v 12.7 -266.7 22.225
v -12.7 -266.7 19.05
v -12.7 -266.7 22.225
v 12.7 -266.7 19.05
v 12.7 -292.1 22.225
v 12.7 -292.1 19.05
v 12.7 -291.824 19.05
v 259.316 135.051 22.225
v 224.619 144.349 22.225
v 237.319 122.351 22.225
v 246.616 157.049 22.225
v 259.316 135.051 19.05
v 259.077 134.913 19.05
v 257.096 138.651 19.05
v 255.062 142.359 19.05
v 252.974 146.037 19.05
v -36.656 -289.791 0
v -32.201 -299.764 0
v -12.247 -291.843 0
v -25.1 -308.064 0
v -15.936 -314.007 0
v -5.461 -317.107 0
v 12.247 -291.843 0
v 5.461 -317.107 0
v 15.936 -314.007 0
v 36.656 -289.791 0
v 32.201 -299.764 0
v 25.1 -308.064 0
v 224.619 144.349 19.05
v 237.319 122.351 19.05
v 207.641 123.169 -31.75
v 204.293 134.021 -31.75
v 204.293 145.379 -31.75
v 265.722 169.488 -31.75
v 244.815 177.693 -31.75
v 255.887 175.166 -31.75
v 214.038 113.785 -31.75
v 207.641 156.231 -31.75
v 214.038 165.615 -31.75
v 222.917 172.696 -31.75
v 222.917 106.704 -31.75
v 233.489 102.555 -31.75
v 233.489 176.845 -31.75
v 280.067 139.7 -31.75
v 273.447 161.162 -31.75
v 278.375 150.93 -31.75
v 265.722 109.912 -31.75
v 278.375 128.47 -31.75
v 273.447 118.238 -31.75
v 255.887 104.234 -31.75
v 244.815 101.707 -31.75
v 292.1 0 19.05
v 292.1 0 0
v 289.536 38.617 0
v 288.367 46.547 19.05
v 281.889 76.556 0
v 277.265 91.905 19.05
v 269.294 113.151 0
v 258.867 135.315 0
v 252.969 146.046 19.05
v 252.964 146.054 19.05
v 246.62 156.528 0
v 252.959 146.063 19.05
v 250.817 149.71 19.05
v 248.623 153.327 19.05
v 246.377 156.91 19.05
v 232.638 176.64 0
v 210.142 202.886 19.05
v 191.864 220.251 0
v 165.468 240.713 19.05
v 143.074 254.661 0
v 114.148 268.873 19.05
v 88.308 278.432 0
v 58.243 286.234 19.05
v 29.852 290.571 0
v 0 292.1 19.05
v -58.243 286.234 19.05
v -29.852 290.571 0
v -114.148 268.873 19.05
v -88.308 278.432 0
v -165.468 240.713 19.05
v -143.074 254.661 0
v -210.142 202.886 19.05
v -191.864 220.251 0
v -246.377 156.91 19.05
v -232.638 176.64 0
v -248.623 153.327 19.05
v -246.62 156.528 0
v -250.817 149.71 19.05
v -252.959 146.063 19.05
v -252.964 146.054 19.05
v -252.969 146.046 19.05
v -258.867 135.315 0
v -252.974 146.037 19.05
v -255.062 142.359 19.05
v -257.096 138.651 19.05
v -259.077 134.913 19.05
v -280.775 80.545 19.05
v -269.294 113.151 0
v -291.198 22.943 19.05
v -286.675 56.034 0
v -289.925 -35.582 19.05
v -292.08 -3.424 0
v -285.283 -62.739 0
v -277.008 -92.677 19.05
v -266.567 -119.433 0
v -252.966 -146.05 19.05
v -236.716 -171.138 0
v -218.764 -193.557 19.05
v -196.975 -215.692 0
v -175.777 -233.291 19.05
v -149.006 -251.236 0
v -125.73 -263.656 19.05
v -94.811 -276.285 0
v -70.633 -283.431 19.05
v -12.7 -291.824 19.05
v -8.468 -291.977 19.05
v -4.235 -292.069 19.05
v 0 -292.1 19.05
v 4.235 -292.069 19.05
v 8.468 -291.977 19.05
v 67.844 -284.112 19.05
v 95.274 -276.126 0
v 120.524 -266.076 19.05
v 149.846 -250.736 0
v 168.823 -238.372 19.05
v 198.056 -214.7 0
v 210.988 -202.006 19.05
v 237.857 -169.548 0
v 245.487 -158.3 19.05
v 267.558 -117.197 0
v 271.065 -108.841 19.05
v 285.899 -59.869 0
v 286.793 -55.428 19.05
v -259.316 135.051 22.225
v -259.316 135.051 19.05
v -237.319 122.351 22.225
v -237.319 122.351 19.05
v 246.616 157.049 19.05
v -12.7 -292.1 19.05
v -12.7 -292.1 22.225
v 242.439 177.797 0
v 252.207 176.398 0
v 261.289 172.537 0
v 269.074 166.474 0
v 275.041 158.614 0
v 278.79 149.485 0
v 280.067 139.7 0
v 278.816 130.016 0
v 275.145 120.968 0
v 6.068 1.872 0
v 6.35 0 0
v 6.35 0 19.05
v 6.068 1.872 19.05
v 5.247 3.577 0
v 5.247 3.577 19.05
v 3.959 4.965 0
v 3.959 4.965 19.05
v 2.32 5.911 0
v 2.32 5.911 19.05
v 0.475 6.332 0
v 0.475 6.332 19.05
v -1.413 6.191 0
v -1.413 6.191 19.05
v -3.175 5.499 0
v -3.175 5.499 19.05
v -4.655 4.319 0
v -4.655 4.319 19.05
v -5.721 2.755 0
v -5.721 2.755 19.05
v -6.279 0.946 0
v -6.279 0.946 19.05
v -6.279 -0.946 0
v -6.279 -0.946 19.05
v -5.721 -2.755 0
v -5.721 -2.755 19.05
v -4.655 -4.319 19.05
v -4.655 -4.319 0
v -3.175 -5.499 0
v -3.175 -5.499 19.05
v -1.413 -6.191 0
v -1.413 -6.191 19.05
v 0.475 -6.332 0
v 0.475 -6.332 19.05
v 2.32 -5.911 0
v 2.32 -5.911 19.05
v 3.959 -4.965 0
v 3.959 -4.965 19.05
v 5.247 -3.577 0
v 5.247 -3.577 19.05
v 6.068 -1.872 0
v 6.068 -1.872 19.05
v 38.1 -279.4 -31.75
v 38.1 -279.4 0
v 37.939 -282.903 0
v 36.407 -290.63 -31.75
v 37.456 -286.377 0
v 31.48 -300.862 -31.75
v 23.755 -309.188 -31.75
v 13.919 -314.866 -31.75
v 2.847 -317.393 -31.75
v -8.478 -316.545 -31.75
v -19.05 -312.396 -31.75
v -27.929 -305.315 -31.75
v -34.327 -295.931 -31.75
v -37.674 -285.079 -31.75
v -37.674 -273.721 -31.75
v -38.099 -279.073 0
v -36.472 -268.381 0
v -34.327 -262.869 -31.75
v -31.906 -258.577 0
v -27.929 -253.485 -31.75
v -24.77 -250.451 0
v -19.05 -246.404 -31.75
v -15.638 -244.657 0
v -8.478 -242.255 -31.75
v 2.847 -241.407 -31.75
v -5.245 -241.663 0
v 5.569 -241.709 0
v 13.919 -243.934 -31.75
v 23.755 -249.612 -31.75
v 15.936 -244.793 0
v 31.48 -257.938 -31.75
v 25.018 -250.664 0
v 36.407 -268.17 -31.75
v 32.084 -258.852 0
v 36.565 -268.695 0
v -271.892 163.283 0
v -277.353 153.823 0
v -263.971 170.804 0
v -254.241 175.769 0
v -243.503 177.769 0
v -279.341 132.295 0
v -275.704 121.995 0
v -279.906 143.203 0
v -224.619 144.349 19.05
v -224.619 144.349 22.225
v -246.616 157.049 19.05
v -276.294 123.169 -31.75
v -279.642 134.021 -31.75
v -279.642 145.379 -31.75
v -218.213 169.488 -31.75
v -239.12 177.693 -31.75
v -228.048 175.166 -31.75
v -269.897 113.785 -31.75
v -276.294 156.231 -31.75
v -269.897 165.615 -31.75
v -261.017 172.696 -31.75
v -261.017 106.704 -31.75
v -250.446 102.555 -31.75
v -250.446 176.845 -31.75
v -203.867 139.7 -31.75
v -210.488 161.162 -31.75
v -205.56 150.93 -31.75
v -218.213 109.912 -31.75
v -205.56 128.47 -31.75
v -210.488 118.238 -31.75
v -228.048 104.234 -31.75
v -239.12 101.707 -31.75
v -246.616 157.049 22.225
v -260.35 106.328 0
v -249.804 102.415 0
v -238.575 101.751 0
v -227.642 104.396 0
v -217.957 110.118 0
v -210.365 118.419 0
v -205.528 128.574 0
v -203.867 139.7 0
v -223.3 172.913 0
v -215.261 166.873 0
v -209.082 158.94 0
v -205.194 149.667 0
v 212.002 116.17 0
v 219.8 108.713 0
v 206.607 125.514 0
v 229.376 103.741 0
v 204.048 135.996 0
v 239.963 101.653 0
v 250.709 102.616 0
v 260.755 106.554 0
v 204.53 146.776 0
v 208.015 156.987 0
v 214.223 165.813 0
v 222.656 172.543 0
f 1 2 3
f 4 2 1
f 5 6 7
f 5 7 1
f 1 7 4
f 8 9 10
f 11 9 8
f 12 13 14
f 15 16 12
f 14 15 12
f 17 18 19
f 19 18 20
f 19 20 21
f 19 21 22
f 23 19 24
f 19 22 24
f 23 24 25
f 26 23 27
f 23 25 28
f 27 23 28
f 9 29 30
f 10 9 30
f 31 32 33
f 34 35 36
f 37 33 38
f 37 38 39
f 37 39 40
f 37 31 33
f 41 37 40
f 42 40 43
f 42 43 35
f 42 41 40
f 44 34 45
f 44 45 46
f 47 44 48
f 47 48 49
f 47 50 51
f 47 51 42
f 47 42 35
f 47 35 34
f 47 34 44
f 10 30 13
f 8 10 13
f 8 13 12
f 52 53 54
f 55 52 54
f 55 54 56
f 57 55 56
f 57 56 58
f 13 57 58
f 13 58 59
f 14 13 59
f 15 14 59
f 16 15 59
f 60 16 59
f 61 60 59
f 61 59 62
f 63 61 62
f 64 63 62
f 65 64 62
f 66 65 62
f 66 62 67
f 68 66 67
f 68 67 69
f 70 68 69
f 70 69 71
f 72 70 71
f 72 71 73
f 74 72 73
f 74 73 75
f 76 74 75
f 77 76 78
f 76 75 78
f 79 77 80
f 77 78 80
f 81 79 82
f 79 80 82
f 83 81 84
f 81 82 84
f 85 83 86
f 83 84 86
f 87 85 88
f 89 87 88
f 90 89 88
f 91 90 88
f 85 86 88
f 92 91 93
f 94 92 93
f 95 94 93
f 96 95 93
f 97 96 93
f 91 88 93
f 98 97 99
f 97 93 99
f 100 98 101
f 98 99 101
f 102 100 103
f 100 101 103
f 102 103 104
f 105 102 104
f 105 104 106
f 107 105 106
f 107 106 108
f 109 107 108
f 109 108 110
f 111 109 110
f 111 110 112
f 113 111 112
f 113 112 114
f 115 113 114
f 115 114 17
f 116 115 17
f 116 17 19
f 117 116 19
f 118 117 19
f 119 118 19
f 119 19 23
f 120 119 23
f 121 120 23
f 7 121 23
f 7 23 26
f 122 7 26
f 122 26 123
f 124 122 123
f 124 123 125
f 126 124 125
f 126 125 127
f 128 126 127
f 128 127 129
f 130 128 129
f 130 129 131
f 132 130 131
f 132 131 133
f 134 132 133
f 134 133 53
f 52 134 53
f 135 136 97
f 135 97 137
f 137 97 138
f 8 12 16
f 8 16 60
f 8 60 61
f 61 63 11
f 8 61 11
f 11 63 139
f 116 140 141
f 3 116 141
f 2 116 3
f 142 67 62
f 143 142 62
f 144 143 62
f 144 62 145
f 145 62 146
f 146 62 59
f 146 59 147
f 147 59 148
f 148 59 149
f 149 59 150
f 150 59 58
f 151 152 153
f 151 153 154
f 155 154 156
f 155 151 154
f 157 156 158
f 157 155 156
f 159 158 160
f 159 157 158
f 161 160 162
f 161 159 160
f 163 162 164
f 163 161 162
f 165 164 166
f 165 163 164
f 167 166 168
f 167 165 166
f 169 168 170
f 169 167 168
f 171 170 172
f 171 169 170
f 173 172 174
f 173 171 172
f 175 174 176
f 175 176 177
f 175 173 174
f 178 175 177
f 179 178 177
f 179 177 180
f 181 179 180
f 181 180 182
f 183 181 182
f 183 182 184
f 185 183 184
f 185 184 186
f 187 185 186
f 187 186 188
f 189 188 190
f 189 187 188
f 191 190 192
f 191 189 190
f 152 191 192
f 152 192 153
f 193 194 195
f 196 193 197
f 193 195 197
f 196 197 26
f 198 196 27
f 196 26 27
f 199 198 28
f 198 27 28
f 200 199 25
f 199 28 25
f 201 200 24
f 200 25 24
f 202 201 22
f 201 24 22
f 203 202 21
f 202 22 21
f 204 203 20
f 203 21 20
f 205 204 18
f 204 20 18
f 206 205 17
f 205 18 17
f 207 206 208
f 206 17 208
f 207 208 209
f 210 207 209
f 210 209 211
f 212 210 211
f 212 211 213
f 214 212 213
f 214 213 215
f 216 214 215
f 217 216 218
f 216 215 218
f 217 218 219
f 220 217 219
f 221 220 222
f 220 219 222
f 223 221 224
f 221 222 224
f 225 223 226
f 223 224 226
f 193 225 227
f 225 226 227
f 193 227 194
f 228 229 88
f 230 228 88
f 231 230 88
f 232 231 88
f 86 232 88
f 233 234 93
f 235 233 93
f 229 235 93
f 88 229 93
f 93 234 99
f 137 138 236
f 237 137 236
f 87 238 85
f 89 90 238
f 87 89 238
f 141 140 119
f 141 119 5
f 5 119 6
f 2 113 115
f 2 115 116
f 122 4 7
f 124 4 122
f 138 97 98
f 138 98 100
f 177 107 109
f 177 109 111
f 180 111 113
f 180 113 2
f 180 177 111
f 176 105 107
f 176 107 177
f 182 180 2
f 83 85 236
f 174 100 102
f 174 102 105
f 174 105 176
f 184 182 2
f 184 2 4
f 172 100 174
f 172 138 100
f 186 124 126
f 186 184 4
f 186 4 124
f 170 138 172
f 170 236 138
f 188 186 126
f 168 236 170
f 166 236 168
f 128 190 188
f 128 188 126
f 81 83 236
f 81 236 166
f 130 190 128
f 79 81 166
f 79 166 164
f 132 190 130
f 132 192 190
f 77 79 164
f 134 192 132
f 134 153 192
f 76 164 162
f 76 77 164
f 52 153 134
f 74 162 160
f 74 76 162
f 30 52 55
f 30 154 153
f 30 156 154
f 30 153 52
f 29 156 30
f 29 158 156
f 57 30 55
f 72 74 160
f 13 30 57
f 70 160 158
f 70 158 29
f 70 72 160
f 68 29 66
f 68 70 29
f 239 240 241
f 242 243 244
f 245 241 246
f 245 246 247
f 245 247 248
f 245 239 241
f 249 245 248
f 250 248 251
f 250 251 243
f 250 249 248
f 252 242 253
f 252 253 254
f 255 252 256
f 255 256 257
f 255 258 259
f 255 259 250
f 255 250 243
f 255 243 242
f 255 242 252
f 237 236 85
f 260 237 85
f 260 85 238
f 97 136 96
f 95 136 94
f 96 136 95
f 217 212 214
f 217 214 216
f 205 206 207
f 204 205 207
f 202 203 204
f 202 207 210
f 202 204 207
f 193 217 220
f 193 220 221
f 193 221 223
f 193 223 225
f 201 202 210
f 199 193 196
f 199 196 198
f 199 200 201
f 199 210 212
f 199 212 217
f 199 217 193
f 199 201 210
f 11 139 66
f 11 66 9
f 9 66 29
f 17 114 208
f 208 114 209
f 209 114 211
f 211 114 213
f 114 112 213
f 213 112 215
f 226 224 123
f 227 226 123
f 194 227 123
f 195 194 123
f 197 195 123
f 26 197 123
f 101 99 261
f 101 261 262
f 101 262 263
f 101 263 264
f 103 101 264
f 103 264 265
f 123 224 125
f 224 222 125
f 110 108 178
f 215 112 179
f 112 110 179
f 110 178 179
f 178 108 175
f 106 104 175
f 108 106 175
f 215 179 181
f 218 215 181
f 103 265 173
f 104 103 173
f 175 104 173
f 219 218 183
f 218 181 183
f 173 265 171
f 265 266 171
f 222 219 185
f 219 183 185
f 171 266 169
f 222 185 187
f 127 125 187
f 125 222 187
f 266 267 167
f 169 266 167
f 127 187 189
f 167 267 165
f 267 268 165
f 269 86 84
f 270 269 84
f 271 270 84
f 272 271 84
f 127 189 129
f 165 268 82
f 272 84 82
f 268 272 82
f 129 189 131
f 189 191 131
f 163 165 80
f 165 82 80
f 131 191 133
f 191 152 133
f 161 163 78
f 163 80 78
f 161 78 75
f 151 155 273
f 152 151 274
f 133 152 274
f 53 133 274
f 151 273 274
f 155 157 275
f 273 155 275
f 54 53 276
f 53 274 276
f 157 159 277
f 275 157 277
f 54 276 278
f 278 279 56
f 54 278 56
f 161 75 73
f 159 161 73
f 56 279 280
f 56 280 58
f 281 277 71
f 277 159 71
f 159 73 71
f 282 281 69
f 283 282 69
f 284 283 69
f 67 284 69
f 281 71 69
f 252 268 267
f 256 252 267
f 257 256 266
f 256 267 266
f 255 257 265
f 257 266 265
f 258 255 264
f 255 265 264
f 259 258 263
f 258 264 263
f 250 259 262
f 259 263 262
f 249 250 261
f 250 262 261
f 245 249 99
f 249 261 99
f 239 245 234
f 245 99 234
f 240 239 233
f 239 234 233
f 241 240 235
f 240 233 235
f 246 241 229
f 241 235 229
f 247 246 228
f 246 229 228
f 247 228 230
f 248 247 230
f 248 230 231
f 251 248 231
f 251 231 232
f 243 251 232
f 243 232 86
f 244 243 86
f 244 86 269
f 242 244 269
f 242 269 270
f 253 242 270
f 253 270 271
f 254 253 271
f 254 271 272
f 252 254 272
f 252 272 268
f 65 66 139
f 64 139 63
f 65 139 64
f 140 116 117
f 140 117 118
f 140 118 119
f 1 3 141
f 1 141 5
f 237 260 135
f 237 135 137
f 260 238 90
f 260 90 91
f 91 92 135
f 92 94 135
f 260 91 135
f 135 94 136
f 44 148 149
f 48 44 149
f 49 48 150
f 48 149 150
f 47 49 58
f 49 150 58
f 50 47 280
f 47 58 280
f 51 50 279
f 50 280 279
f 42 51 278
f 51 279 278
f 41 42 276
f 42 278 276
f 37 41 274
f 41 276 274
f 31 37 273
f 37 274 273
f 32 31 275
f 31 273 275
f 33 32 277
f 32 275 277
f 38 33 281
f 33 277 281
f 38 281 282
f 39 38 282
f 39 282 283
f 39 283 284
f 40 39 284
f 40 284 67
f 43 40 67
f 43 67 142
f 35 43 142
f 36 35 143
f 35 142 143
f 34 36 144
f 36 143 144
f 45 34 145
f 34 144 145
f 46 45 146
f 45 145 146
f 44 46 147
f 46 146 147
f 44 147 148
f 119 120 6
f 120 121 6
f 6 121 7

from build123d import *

# Parameters (mm, degrees)
SKETCH003_R   = 292.1
SKETCH003_R_2 = 6.35
PAD003_DEPTH  = 19.05
SKETCH004_R   = 38.1
PAD004_DEPTH  = 31.75
SKETCH005_W   = 25.4
SKETCH005_H   = 25.4
PAD005_DEPTH  = 3.175


with BuildPart() as part:
    # Sketch003 → Pad003 (new body)
    with BuildSketch(Plane.XY):
        Circle(SKETCH003_R)
        Circle(SKETCH003_R_2, mode=Mode.SUBTRACT)
    extrude(amount=PAD003_DEPTH)

    # Sketch004 (on Face3 of Pad003) → Pad004 (join)
    with BuildSketch(Plane(origin=(0, 0, 0), x_dir=(1, 0, 0), z_dir=(0, 0, -1))):
        with Locations((0, 279.4)):
            Circle(SKETCH004_R)
        with Locations((241.967498, -139.7)):
            Circle(SKETCH004_R)
        with Locations((-241.967498, -139.7)):
            Circle(SKETCH004_R)
    extrude(amount=PAD004_DEPTH)

    # Sketch005 (on Face6 of Pad004) → Pad005 (join)
    with BuildSketch(Plane.XY.offset(19.05)):
        Polygon((-237.318975, 122.351477), (-224.618975, 144.348523), (-246.61602, 157.048523), (-259.31602, 135.051477), align=None)
        Polygon((237.318975, 122.351477), (259.31602, 135.051477), (246.61602, 157.048523), (224.618975, 144.348523), align=None)
        with Locations((0, -279.4)):
            Rectangle(SKETCH005_W, SKETCH005_H)
    extrude(amount=PAD005_DEPTH)


solid = part.part
